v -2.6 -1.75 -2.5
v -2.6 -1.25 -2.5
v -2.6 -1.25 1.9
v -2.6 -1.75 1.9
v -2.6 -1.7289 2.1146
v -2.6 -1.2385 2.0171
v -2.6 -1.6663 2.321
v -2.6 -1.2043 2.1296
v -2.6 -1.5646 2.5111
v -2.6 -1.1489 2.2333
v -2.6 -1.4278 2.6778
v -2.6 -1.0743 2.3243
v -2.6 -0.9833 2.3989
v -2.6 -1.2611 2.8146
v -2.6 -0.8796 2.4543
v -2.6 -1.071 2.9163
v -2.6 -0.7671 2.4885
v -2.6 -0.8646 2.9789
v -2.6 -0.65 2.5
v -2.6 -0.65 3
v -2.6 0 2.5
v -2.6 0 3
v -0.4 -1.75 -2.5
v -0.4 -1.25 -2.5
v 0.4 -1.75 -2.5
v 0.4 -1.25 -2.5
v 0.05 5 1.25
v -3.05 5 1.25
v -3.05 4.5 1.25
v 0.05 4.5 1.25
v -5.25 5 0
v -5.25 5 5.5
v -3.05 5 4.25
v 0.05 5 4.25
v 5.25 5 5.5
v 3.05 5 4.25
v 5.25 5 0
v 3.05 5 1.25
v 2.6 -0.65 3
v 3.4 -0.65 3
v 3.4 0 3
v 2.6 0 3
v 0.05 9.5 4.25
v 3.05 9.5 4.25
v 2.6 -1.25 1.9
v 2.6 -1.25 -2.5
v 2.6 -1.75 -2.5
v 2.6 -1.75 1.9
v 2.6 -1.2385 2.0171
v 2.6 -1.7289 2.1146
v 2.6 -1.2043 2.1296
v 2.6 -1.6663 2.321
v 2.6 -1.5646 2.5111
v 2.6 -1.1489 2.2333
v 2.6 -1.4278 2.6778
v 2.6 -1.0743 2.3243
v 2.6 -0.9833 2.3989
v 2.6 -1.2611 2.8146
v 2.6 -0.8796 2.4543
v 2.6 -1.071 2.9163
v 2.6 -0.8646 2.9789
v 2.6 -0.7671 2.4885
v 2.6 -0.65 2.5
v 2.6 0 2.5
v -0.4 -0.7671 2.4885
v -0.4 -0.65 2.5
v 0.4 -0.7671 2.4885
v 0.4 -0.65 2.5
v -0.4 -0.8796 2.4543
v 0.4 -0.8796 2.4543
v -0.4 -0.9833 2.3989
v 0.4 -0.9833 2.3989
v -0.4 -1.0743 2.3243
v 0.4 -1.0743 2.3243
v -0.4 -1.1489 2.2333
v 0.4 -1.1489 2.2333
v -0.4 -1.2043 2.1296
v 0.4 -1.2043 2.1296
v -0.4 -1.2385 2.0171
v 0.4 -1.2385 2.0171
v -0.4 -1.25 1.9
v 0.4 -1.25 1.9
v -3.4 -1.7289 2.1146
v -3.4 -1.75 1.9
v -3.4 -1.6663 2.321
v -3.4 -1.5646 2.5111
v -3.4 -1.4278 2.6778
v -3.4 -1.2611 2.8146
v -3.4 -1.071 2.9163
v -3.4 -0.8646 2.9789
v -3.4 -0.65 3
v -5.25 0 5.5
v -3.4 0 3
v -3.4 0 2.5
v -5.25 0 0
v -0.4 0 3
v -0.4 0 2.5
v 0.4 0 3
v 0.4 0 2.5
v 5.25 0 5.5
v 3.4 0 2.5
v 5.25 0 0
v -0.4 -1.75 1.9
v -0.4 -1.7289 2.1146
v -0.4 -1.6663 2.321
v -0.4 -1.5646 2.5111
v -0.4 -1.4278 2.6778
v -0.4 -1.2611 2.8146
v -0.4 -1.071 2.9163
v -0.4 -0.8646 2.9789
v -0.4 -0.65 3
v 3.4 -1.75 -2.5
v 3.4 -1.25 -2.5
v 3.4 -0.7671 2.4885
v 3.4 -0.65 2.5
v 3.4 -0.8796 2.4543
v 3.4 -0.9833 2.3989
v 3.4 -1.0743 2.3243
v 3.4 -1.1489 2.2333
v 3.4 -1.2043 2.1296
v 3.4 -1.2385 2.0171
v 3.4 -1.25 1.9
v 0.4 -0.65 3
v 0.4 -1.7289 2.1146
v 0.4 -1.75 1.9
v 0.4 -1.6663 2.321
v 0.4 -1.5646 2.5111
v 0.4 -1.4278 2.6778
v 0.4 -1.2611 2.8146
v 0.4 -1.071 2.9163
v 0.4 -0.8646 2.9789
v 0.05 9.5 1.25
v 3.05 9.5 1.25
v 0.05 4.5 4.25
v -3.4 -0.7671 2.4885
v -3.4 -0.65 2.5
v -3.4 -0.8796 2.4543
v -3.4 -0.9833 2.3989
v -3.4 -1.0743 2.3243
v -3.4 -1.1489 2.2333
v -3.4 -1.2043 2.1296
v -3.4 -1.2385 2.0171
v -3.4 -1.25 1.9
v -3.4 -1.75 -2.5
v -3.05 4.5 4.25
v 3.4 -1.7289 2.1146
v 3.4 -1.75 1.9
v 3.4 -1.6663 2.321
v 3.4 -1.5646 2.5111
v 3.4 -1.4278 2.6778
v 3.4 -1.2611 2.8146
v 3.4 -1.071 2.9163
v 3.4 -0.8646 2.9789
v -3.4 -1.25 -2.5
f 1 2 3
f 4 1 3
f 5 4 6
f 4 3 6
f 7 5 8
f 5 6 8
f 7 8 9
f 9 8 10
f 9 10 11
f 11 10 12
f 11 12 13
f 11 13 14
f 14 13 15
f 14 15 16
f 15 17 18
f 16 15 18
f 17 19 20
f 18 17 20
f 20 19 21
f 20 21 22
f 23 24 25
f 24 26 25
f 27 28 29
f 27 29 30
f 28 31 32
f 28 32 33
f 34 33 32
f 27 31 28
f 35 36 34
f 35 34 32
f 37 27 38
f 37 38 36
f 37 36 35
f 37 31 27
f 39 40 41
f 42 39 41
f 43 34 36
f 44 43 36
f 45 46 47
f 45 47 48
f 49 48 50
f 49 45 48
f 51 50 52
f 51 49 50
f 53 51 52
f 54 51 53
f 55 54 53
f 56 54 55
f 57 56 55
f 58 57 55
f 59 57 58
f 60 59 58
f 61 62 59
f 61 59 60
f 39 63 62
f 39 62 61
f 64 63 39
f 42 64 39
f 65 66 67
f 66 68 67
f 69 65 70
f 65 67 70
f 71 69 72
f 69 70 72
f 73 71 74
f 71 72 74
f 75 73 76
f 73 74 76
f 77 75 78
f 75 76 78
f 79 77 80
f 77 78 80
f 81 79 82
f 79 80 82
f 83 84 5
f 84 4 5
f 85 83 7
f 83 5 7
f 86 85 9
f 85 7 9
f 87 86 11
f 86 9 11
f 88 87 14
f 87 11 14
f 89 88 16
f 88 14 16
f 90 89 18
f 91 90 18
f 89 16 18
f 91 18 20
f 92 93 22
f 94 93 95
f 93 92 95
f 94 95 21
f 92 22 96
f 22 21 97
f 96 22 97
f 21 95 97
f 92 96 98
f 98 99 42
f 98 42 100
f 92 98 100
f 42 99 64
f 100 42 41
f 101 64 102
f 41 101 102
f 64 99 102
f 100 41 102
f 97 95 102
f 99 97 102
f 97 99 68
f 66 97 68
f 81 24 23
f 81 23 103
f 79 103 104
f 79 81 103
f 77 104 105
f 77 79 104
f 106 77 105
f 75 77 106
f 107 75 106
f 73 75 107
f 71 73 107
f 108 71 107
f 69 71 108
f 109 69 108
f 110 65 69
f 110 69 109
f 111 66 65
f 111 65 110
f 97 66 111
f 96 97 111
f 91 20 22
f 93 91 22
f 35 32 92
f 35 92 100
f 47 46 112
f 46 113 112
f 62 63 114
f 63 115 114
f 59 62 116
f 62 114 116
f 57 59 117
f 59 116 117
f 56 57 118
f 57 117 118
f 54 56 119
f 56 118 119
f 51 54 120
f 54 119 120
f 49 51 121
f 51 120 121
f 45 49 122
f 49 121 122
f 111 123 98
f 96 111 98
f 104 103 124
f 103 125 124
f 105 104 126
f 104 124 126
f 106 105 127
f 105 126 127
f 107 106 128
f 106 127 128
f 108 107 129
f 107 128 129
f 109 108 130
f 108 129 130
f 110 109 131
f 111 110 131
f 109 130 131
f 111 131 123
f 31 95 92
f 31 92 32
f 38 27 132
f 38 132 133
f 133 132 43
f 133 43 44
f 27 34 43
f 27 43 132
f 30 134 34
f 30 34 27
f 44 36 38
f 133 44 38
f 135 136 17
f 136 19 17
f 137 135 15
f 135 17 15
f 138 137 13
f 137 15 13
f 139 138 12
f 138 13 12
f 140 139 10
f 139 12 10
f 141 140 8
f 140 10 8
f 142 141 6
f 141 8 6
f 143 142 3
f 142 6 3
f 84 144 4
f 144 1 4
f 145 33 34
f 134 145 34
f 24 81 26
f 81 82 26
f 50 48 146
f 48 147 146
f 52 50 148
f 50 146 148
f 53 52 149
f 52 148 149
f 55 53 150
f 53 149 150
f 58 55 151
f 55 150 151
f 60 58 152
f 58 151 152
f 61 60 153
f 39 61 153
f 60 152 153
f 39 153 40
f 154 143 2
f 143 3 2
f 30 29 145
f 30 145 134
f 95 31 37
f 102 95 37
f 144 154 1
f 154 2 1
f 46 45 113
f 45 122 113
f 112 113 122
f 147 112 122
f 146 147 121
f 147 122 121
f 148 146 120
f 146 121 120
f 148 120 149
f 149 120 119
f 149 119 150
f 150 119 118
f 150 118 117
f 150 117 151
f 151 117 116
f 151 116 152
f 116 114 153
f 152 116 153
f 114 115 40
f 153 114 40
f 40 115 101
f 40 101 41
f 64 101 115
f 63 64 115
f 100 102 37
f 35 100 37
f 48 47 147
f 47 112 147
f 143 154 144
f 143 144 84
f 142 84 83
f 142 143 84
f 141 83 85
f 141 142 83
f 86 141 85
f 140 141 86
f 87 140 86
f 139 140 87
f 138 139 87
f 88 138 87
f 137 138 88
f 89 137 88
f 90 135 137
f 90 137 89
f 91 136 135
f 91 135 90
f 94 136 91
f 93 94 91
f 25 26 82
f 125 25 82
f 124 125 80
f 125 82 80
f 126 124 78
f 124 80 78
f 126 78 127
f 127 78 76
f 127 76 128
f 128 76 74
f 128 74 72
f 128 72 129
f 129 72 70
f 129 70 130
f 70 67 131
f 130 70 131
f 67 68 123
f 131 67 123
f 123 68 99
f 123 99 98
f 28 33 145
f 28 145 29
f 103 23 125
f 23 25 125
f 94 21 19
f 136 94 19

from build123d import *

# Parameters (mm, degrees)
SKETCH1_W           = 10.5
SKETCH1_H           = 5
BOSS_EXTRUDE1_DEPTH = 5.5
SKETCH2_W           = 6.1
SKETCH2_H           = 3
CUT_EXTRUDE1_DEPTH  = 0.5
SKETCH3_W           = 3
SKETCH3_H           = 3
BOSS_EXTRUDE2_DEPTH = 5
BOSS_EXTRUDE3_DEPTH = 0.4
LPATTERN1_COUNT     = 2
LPATTERN1_PITCH     = 3
LPATTERN1_COL_COUNT = 2
LPATTERN1_COL_PITCH = 3


with BuildPart() as part:
    # Sketch1 → Boss-Extrude1 (new body)
    with BuildSketch(Plane.XY):
        with Locations((0, 2.5)):
            Rectangle(SKETCH1_W, SKETCH1_H)
    extrude(amount=BOSS_EXTRUDE1_DEPTH)

    # Sketch2 → Cut-Extrude1 (cut)
    with BuildSketch(Plane(origin=(0, 5, 0), x_dir=(1, 0, 0), z_dir=(0, 1, 0))):
        with Locations((0, -2.75)):
            Rectangle(SKETCH2_W, SKETCH2_H)
    extrude(amount=-CUT_EXTRUDE1_DEPTH, mode=Mode.SUBTRACT)

    # Sketch3 → Boss-Extrude2 (add)
    with BuildSketch(Plane(origin=(0, 4.5, 0), x_dir=(1, 0, 0), z_dir=(0, 1, 0))):
        with Locations((1.55, -2.75)):
            Rectangle(SKETCH3_W, SKETCH3_H)
    extrude(amount=BOSS_EXTRUDE2_DEPTH)

    # Sketch4 → Boss-Extrude3 (add, symmetric)
    with BuildSketch(Plane(origin=(0, 0, 0), x_dir=(0, 0, -1), z_dir=(1, 0, 0))):
        with BuildLine():
            Line((-2.5, 0), (-2.5, -0.65))
            ThreePointArc((-2.5, -0.65), (-2.324264069, -1.074264069), (-1.9, -1.25))
            Line((-1.9, -1.25), (2.5, -1.25))
            Line((2.5, -1.25), (2.5, -1.75))
            Line((2.5, -1.75), (-1.9, -1.75))
            ThreePointArc((-1.9, -1.75), (-2.677817459, -1.427817459), (-3, -0.65))
            Line((-3, -0.65), (-3, 0))
            Line((-3, 0), (-2.5, 0))
        make_face()
    boss_extrude3 = extrude(amount=BOSS_EXTRUDE3_DEPTH, both=True)

    # LPattern1: Boss-Extrude3 ×2
    with Locations(*[(-i * LPATTERN1_PITCH, 0, 0) for i in range(1, LPATTERN1_COUNT)]):
        add(boss_extrude3)

    # LPattern1 col: Boss-Extrude3 ×2
    with Locations(*[(i * LPATTERN1_COL_PITCH, 0, 0) for i in range(1, LPATTERN1_COL_COUNT)]):
        add(boss_extrude3)


solid = part.part
